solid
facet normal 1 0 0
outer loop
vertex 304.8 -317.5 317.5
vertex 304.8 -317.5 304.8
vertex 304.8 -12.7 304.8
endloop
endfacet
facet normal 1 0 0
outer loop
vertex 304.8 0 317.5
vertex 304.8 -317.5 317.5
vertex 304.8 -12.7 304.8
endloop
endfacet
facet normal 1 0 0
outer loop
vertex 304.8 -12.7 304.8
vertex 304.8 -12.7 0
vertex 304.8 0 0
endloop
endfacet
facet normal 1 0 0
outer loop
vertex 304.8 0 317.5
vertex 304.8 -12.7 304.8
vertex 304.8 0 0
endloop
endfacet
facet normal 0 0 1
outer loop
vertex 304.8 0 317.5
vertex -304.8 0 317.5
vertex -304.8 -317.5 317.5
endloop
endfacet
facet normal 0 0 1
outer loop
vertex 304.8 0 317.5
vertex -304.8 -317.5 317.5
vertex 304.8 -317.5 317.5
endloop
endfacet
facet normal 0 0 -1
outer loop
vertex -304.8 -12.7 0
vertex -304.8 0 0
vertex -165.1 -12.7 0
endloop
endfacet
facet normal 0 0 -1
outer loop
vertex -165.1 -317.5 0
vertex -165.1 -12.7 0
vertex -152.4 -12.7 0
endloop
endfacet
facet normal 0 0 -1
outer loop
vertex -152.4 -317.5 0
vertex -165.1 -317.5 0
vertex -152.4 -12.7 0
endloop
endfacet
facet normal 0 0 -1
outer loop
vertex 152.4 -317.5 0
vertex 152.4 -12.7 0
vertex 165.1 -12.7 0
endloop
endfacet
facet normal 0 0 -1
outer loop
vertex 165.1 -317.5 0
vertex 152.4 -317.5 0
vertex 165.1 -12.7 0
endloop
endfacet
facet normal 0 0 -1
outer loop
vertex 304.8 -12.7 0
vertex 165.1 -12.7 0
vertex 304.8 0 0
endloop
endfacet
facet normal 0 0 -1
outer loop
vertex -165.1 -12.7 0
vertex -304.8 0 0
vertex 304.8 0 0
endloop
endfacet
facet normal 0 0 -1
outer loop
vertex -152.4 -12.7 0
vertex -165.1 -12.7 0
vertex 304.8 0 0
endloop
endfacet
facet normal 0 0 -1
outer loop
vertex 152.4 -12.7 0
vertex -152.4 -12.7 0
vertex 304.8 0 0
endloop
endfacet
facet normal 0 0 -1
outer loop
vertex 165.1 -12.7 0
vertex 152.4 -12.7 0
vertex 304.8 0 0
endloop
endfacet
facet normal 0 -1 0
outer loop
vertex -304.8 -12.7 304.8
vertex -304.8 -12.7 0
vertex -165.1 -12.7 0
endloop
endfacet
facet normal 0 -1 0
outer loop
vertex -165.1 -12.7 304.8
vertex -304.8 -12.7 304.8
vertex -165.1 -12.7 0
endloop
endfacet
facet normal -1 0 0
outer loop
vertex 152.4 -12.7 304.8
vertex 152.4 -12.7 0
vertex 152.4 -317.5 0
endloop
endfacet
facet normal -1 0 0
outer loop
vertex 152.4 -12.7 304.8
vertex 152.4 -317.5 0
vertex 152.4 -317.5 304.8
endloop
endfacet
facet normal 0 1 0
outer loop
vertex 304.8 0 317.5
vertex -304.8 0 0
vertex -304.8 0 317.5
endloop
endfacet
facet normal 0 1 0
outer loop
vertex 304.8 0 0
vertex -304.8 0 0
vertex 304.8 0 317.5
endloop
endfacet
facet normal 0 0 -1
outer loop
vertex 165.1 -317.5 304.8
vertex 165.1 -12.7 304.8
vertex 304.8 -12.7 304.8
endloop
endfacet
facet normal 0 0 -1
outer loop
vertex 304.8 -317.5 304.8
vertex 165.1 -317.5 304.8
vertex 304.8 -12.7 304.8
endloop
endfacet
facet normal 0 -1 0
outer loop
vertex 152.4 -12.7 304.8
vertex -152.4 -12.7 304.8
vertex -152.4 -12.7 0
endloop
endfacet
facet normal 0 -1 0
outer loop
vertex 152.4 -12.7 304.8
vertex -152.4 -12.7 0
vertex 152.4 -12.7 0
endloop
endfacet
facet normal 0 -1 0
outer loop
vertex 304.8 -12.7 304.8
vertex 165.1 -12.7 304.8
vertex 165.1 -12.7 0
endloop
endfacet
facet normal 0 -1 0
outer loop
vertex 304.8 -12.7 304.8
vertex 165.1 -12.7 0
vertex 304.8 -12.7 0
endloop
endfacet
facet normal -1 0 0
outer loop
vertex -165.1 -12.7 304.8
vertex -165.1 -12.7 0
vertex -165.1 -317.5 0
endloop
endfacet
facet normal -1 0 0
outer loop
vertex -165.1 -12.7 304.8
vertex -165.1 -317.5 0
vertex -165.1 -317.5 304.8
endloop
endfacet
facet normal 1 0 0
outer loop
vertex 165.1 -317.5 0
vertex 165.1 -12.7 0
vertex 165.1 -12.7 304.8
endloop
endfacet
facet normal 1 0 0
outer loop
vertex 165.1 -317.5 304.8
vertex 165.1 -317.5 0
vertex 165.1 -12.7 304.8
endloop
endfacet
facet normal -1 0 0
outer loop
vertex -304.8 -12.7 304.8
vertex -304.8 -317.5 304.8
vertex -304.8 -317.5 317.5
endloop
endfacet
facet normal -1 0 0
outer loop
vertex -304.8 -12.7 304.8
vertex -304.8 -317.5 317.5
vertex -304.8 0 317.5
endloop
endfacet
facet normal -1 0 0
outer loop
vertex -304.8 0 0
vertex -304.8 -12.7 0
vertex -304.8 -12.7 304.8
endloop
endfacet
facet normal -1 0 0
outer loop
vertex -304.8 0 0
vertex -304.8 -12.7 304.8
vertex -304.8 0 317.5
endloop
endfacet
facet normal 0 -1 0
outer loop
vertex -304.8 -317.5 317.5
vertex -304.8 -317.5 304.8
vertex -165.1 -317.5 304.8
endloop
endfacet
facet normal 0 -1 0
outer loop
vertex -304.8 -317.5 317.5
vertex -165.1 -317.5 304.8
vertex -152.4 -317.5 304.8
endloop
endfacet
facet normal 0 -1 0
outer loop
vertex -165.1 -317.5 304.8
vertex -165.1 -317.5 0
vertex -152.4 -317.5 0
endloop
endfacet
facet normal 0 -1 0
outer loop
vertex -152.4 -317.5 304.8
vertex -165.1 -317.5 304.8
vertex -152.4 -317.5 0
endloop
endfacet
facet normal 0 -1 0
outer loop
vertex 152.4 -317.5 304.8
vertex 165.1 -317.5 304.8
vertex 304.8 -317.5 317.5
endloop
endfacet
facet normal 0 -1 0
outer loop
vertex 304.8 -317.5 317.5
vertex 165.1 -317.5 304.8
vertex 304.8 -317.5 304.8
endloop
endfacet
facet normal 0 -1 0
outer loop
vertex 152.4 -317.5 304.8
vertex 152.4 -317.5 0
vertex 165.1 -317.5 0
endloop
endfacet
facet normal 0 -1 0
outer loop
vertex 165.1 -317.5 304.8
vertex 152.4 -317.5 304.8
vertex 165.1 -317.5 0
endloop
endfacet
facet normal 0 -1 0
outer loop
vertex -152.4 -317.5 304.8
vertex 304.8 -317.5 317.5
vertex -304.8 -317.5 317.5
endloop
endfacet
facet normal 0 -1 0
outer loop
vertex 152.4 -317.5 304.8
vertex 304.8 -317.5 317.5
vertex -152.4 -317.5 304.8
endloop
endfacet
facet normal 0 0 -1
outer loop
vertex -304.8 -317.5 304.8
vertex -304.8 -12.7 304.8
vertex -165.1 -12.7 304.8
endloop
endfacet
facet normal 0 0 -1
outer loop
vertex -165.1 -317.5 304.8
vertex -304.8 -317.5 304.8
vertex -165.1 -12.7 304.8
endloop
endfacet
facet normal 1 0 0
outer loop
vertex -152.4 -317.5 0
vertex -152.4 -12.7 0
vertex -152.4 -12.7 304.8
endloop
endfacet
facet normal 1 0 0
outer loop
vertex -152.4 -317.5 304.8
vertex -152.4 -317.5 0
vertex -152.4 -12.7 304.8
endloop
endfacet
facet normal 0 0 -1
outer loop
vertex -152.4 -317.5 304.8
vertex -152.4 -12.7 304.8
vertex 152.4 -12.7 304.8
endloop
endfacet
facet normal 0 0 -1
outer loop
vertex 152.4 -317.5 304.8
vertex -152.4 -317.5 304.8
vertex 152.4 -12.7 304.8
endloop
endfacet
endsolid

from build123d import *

# Parameters (mm, degrees)
F0_W     = 609.6
F0_H     = 304.8
F1_DEPTH = 12.7
F2_W     = 12.7
F2_H     = 304.8
F3_DEPTH = 304.8
F4_W     = 609.6
F4_H     = 317.5
F5_DEPTH = 12.7


with BuildPart() as f1:
    # F0 (on Front) → F1 (new body)
    with BuildSketch(Plane.XZ):
        with Locations((0, 152.4)):
            Rectangle(F0_W, F0_H)
    extrude(amount=F1_DEPTH)

    # F2 (on face) → F3 (join)
    with BuildSketch(Plane.XZ.offset(12.7)):
        with Locations((-158.75, 152.4)):
            Rectangle(F2_W, F2_H)
        with Locations((158.75, 152.4)):
            Rectangle(F2_W, F2_H)
    extrude(amount=F3_DEPTH)

    # F4 (on face) → F5 (join)
    with BuildSketch(Plane.XY.offset(304.8)):
        with Locations((0, -158.75)):
            Rectangle(F4_W, F4_H)
    extrude(amount=F5_DEPTH)


solid = f1.part
